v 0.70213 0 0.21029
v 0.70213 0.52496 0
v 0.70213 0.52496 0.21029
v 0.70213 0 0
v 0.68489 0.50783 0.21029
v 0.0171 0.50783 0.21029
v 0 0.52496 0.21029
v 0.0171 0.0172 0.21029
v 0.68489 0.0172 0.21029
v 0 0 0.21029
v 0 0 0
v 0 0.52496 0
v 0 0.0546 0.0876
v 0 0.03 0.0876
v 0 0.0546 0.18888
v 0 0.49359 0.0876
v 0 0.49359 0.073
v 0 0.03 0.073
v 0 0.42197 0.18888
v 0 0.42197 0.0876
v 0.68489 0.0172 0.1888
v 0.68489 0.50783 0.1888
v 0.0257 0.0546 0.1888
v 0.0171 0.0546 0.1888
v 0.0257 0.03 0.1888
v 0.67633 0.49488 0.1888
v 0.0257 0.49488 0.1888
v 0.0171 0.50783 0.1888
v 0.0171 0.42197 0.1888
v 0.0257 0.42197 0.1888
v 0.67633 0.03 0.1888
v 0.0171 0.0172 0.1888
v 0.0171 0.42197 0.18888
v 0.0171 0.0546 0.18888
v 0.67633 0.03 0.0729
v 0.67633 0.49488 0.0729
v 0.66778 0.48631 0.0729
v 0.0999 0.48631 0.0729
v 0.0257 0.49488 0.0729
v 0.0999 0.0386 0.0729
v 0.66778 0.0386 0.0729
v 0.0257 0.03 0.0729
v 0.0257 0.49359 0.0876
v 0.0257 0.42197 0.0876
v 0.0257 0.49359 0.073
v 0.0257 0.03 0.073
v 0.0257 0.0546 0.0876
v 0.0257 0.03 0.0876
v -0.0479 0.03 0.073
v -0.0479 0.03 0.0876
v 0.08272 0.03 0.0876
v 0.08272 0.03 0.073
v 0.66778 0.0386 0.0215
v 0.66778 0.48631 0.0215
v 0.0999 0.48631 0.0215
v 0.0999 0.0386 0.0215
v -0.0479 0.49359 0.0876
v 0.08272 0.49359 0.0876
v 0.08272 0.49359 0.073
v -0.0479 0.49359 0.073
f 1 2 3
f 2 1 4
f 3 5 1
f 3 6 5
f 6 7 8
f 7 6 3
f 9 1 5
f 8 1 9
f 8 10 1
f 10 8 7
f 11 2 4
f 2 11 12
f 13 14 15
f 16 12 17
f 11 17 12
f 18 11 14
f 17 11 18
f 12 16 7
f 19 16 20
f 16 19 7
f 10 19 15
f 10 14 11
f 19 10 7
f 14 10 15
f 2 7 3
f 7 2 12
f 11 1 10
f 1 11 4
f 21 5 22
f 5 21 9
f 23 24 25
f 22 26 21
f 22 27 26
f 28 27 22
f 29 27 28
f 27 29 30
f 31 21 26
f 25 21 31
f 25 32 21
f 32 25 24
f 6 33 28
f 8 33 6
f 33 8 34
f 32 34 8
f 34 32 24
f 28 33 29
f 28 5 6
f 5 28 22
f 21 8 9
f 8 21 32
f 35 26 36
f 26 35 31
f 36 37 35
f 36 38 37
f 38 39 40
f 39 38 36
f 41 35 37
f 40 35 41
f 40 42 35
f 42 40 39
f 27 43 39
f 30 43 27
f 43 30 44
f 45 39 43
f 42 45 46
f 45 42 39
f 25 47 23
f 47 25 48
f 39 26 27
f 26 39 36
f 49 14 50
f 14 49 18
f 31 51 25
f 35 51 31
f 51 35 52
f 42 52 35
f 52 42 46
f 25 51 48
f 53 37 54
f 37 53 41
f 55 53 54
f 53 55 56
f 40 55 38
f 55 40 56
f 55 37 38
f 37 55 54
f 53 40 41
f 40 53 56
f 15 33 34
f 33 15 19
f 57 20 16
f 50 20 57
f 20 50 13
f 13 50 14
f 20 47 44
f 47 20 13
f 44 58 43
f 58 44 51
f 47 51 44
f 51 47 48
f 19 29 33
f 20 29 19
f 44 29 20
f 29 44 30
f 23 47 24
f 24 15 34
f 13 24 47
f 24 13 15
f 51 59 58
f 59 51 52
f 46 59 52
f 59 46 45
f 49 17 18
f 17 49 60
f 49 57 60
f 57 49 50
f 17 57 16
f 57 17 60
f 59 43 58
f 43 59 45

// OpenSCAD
// ============================================================
// Stepped-pocket body with side projection and side recess
// All dimensions in model units
// ============================================================

// ---------- Main body ----------
body_L = 0.702127;        // length (X)
body_W = 0.524964;        // width  (Y)
body_H = 0.210295;        // height (Z, nominal 0.2103)

// ---------- Top shallow recess ----------
top_rec_L     = 0.667793; // recess size X
top_rec_W     = 0.490631; // recess size Y
top_rec_left  = 0.0171;   // inset from left edge
top_rec_front = 0.0172;   // inset from front edge
top_rec_z     = 0.1888;   // recess floor height
top_rec_D     = 0.0215;   // recess depth (opens at top)

// ---------- Middle continuation cut ----------
mid_cut_L     = 0.650626;
mid_cut_W     = 0.46488;
mid_cut_left  = 0.0257;   // inset from left edge
mid_cut_front = 0.03;     // inset from front edge
mid_cut_z     = 0.0729;   // cut floor height
mid_cut_D     = 0.1159;   // cut depth (meets top recess floor)

// ---------- Lower contained pocket ----------
low_poc_L     = 0.567882;
low_poc_W     = 0.447713;
low_poc_left  = 0.0999;   // inset from left edge
low_poc_front = 0.0386;   // inset from front edge
low_poc_z     = 0.0215;   // pocket floor (= bottom thickness)
low_poc_D     = 0.0515;   // pocket depth

// ---------- Side projection (added solid, left edge) ----------
proj_L        = 0.130618; // size X
proj_W        = 0.463588; // size Y
proj_over     = 0.0479;   // overhang beyond left edge
proj_front    = 0.03;     // inset from front edge
proj_z        = 0.073;    // bottom of projection
proj_T        = 0.0146;   // thickness (spans 0.073 - 0.0876)

// ---------- Side recess (cut at left edge) ----------
side_rec_D     = 0.0343;  // cut depth into body (X)
side_rec_W     = 0.367372;// face length along Y
side_rec_front = 0.0546;  // inset from front edge
side_rec_z     = 0.0876;  // recess bottom (band 0.0876 - 0.1889)
side_rec_H     = 0.101285;// recess face height

eps = 0.0005;             // overlap margin for clean booleans
$fn = 64;

// ---------- Component modules ----------
module main_body() {
    cube([body_L, body_W, body_H]);
}

module side_projection() {
    // ledge attached at the left edge, overhanging outward
    translate([-proj_over, proj_front, proj_z])
        cube([proj_L, proj_W, proj_T]);
}

module top_recess() {
    translate([top_rec_left, top_rec_front, top_rec_z])
        cube([top_rec_L, top_rec_W, top_rec_D + eps]);
}

module middle_cut() {
    translate([mid_cut_left, mid_cut_front, mid_cut_z])
        cube([mid_cut_L, mid_cut_W, mid_cut_D + eps]);
}

module lower_pocket() {
    translate([low_poc_left, low_poc_front, low_poc_z])
        cube([low_poc_L, low_poc_W, low_poc_D + eps]);
}

module side_recess() {
    // contained side window, does not pass through the body
    translate([-eps, side_rec_front, side_rec_z])
        cube([side_rec_D + eps, side_rec_W, side_rec_H]);
}

// ---------- Final assembly ----------
union() {
    difference() {
        main_body();
        top_recess();       // shallow top recess
        middle_cut();       // deeper continuation cut
        lower_pocket();     // lowest contained pocket
        side_recess();      // left-edge side recess
    }
    side_projection();      // added ledge solid on left side
}
